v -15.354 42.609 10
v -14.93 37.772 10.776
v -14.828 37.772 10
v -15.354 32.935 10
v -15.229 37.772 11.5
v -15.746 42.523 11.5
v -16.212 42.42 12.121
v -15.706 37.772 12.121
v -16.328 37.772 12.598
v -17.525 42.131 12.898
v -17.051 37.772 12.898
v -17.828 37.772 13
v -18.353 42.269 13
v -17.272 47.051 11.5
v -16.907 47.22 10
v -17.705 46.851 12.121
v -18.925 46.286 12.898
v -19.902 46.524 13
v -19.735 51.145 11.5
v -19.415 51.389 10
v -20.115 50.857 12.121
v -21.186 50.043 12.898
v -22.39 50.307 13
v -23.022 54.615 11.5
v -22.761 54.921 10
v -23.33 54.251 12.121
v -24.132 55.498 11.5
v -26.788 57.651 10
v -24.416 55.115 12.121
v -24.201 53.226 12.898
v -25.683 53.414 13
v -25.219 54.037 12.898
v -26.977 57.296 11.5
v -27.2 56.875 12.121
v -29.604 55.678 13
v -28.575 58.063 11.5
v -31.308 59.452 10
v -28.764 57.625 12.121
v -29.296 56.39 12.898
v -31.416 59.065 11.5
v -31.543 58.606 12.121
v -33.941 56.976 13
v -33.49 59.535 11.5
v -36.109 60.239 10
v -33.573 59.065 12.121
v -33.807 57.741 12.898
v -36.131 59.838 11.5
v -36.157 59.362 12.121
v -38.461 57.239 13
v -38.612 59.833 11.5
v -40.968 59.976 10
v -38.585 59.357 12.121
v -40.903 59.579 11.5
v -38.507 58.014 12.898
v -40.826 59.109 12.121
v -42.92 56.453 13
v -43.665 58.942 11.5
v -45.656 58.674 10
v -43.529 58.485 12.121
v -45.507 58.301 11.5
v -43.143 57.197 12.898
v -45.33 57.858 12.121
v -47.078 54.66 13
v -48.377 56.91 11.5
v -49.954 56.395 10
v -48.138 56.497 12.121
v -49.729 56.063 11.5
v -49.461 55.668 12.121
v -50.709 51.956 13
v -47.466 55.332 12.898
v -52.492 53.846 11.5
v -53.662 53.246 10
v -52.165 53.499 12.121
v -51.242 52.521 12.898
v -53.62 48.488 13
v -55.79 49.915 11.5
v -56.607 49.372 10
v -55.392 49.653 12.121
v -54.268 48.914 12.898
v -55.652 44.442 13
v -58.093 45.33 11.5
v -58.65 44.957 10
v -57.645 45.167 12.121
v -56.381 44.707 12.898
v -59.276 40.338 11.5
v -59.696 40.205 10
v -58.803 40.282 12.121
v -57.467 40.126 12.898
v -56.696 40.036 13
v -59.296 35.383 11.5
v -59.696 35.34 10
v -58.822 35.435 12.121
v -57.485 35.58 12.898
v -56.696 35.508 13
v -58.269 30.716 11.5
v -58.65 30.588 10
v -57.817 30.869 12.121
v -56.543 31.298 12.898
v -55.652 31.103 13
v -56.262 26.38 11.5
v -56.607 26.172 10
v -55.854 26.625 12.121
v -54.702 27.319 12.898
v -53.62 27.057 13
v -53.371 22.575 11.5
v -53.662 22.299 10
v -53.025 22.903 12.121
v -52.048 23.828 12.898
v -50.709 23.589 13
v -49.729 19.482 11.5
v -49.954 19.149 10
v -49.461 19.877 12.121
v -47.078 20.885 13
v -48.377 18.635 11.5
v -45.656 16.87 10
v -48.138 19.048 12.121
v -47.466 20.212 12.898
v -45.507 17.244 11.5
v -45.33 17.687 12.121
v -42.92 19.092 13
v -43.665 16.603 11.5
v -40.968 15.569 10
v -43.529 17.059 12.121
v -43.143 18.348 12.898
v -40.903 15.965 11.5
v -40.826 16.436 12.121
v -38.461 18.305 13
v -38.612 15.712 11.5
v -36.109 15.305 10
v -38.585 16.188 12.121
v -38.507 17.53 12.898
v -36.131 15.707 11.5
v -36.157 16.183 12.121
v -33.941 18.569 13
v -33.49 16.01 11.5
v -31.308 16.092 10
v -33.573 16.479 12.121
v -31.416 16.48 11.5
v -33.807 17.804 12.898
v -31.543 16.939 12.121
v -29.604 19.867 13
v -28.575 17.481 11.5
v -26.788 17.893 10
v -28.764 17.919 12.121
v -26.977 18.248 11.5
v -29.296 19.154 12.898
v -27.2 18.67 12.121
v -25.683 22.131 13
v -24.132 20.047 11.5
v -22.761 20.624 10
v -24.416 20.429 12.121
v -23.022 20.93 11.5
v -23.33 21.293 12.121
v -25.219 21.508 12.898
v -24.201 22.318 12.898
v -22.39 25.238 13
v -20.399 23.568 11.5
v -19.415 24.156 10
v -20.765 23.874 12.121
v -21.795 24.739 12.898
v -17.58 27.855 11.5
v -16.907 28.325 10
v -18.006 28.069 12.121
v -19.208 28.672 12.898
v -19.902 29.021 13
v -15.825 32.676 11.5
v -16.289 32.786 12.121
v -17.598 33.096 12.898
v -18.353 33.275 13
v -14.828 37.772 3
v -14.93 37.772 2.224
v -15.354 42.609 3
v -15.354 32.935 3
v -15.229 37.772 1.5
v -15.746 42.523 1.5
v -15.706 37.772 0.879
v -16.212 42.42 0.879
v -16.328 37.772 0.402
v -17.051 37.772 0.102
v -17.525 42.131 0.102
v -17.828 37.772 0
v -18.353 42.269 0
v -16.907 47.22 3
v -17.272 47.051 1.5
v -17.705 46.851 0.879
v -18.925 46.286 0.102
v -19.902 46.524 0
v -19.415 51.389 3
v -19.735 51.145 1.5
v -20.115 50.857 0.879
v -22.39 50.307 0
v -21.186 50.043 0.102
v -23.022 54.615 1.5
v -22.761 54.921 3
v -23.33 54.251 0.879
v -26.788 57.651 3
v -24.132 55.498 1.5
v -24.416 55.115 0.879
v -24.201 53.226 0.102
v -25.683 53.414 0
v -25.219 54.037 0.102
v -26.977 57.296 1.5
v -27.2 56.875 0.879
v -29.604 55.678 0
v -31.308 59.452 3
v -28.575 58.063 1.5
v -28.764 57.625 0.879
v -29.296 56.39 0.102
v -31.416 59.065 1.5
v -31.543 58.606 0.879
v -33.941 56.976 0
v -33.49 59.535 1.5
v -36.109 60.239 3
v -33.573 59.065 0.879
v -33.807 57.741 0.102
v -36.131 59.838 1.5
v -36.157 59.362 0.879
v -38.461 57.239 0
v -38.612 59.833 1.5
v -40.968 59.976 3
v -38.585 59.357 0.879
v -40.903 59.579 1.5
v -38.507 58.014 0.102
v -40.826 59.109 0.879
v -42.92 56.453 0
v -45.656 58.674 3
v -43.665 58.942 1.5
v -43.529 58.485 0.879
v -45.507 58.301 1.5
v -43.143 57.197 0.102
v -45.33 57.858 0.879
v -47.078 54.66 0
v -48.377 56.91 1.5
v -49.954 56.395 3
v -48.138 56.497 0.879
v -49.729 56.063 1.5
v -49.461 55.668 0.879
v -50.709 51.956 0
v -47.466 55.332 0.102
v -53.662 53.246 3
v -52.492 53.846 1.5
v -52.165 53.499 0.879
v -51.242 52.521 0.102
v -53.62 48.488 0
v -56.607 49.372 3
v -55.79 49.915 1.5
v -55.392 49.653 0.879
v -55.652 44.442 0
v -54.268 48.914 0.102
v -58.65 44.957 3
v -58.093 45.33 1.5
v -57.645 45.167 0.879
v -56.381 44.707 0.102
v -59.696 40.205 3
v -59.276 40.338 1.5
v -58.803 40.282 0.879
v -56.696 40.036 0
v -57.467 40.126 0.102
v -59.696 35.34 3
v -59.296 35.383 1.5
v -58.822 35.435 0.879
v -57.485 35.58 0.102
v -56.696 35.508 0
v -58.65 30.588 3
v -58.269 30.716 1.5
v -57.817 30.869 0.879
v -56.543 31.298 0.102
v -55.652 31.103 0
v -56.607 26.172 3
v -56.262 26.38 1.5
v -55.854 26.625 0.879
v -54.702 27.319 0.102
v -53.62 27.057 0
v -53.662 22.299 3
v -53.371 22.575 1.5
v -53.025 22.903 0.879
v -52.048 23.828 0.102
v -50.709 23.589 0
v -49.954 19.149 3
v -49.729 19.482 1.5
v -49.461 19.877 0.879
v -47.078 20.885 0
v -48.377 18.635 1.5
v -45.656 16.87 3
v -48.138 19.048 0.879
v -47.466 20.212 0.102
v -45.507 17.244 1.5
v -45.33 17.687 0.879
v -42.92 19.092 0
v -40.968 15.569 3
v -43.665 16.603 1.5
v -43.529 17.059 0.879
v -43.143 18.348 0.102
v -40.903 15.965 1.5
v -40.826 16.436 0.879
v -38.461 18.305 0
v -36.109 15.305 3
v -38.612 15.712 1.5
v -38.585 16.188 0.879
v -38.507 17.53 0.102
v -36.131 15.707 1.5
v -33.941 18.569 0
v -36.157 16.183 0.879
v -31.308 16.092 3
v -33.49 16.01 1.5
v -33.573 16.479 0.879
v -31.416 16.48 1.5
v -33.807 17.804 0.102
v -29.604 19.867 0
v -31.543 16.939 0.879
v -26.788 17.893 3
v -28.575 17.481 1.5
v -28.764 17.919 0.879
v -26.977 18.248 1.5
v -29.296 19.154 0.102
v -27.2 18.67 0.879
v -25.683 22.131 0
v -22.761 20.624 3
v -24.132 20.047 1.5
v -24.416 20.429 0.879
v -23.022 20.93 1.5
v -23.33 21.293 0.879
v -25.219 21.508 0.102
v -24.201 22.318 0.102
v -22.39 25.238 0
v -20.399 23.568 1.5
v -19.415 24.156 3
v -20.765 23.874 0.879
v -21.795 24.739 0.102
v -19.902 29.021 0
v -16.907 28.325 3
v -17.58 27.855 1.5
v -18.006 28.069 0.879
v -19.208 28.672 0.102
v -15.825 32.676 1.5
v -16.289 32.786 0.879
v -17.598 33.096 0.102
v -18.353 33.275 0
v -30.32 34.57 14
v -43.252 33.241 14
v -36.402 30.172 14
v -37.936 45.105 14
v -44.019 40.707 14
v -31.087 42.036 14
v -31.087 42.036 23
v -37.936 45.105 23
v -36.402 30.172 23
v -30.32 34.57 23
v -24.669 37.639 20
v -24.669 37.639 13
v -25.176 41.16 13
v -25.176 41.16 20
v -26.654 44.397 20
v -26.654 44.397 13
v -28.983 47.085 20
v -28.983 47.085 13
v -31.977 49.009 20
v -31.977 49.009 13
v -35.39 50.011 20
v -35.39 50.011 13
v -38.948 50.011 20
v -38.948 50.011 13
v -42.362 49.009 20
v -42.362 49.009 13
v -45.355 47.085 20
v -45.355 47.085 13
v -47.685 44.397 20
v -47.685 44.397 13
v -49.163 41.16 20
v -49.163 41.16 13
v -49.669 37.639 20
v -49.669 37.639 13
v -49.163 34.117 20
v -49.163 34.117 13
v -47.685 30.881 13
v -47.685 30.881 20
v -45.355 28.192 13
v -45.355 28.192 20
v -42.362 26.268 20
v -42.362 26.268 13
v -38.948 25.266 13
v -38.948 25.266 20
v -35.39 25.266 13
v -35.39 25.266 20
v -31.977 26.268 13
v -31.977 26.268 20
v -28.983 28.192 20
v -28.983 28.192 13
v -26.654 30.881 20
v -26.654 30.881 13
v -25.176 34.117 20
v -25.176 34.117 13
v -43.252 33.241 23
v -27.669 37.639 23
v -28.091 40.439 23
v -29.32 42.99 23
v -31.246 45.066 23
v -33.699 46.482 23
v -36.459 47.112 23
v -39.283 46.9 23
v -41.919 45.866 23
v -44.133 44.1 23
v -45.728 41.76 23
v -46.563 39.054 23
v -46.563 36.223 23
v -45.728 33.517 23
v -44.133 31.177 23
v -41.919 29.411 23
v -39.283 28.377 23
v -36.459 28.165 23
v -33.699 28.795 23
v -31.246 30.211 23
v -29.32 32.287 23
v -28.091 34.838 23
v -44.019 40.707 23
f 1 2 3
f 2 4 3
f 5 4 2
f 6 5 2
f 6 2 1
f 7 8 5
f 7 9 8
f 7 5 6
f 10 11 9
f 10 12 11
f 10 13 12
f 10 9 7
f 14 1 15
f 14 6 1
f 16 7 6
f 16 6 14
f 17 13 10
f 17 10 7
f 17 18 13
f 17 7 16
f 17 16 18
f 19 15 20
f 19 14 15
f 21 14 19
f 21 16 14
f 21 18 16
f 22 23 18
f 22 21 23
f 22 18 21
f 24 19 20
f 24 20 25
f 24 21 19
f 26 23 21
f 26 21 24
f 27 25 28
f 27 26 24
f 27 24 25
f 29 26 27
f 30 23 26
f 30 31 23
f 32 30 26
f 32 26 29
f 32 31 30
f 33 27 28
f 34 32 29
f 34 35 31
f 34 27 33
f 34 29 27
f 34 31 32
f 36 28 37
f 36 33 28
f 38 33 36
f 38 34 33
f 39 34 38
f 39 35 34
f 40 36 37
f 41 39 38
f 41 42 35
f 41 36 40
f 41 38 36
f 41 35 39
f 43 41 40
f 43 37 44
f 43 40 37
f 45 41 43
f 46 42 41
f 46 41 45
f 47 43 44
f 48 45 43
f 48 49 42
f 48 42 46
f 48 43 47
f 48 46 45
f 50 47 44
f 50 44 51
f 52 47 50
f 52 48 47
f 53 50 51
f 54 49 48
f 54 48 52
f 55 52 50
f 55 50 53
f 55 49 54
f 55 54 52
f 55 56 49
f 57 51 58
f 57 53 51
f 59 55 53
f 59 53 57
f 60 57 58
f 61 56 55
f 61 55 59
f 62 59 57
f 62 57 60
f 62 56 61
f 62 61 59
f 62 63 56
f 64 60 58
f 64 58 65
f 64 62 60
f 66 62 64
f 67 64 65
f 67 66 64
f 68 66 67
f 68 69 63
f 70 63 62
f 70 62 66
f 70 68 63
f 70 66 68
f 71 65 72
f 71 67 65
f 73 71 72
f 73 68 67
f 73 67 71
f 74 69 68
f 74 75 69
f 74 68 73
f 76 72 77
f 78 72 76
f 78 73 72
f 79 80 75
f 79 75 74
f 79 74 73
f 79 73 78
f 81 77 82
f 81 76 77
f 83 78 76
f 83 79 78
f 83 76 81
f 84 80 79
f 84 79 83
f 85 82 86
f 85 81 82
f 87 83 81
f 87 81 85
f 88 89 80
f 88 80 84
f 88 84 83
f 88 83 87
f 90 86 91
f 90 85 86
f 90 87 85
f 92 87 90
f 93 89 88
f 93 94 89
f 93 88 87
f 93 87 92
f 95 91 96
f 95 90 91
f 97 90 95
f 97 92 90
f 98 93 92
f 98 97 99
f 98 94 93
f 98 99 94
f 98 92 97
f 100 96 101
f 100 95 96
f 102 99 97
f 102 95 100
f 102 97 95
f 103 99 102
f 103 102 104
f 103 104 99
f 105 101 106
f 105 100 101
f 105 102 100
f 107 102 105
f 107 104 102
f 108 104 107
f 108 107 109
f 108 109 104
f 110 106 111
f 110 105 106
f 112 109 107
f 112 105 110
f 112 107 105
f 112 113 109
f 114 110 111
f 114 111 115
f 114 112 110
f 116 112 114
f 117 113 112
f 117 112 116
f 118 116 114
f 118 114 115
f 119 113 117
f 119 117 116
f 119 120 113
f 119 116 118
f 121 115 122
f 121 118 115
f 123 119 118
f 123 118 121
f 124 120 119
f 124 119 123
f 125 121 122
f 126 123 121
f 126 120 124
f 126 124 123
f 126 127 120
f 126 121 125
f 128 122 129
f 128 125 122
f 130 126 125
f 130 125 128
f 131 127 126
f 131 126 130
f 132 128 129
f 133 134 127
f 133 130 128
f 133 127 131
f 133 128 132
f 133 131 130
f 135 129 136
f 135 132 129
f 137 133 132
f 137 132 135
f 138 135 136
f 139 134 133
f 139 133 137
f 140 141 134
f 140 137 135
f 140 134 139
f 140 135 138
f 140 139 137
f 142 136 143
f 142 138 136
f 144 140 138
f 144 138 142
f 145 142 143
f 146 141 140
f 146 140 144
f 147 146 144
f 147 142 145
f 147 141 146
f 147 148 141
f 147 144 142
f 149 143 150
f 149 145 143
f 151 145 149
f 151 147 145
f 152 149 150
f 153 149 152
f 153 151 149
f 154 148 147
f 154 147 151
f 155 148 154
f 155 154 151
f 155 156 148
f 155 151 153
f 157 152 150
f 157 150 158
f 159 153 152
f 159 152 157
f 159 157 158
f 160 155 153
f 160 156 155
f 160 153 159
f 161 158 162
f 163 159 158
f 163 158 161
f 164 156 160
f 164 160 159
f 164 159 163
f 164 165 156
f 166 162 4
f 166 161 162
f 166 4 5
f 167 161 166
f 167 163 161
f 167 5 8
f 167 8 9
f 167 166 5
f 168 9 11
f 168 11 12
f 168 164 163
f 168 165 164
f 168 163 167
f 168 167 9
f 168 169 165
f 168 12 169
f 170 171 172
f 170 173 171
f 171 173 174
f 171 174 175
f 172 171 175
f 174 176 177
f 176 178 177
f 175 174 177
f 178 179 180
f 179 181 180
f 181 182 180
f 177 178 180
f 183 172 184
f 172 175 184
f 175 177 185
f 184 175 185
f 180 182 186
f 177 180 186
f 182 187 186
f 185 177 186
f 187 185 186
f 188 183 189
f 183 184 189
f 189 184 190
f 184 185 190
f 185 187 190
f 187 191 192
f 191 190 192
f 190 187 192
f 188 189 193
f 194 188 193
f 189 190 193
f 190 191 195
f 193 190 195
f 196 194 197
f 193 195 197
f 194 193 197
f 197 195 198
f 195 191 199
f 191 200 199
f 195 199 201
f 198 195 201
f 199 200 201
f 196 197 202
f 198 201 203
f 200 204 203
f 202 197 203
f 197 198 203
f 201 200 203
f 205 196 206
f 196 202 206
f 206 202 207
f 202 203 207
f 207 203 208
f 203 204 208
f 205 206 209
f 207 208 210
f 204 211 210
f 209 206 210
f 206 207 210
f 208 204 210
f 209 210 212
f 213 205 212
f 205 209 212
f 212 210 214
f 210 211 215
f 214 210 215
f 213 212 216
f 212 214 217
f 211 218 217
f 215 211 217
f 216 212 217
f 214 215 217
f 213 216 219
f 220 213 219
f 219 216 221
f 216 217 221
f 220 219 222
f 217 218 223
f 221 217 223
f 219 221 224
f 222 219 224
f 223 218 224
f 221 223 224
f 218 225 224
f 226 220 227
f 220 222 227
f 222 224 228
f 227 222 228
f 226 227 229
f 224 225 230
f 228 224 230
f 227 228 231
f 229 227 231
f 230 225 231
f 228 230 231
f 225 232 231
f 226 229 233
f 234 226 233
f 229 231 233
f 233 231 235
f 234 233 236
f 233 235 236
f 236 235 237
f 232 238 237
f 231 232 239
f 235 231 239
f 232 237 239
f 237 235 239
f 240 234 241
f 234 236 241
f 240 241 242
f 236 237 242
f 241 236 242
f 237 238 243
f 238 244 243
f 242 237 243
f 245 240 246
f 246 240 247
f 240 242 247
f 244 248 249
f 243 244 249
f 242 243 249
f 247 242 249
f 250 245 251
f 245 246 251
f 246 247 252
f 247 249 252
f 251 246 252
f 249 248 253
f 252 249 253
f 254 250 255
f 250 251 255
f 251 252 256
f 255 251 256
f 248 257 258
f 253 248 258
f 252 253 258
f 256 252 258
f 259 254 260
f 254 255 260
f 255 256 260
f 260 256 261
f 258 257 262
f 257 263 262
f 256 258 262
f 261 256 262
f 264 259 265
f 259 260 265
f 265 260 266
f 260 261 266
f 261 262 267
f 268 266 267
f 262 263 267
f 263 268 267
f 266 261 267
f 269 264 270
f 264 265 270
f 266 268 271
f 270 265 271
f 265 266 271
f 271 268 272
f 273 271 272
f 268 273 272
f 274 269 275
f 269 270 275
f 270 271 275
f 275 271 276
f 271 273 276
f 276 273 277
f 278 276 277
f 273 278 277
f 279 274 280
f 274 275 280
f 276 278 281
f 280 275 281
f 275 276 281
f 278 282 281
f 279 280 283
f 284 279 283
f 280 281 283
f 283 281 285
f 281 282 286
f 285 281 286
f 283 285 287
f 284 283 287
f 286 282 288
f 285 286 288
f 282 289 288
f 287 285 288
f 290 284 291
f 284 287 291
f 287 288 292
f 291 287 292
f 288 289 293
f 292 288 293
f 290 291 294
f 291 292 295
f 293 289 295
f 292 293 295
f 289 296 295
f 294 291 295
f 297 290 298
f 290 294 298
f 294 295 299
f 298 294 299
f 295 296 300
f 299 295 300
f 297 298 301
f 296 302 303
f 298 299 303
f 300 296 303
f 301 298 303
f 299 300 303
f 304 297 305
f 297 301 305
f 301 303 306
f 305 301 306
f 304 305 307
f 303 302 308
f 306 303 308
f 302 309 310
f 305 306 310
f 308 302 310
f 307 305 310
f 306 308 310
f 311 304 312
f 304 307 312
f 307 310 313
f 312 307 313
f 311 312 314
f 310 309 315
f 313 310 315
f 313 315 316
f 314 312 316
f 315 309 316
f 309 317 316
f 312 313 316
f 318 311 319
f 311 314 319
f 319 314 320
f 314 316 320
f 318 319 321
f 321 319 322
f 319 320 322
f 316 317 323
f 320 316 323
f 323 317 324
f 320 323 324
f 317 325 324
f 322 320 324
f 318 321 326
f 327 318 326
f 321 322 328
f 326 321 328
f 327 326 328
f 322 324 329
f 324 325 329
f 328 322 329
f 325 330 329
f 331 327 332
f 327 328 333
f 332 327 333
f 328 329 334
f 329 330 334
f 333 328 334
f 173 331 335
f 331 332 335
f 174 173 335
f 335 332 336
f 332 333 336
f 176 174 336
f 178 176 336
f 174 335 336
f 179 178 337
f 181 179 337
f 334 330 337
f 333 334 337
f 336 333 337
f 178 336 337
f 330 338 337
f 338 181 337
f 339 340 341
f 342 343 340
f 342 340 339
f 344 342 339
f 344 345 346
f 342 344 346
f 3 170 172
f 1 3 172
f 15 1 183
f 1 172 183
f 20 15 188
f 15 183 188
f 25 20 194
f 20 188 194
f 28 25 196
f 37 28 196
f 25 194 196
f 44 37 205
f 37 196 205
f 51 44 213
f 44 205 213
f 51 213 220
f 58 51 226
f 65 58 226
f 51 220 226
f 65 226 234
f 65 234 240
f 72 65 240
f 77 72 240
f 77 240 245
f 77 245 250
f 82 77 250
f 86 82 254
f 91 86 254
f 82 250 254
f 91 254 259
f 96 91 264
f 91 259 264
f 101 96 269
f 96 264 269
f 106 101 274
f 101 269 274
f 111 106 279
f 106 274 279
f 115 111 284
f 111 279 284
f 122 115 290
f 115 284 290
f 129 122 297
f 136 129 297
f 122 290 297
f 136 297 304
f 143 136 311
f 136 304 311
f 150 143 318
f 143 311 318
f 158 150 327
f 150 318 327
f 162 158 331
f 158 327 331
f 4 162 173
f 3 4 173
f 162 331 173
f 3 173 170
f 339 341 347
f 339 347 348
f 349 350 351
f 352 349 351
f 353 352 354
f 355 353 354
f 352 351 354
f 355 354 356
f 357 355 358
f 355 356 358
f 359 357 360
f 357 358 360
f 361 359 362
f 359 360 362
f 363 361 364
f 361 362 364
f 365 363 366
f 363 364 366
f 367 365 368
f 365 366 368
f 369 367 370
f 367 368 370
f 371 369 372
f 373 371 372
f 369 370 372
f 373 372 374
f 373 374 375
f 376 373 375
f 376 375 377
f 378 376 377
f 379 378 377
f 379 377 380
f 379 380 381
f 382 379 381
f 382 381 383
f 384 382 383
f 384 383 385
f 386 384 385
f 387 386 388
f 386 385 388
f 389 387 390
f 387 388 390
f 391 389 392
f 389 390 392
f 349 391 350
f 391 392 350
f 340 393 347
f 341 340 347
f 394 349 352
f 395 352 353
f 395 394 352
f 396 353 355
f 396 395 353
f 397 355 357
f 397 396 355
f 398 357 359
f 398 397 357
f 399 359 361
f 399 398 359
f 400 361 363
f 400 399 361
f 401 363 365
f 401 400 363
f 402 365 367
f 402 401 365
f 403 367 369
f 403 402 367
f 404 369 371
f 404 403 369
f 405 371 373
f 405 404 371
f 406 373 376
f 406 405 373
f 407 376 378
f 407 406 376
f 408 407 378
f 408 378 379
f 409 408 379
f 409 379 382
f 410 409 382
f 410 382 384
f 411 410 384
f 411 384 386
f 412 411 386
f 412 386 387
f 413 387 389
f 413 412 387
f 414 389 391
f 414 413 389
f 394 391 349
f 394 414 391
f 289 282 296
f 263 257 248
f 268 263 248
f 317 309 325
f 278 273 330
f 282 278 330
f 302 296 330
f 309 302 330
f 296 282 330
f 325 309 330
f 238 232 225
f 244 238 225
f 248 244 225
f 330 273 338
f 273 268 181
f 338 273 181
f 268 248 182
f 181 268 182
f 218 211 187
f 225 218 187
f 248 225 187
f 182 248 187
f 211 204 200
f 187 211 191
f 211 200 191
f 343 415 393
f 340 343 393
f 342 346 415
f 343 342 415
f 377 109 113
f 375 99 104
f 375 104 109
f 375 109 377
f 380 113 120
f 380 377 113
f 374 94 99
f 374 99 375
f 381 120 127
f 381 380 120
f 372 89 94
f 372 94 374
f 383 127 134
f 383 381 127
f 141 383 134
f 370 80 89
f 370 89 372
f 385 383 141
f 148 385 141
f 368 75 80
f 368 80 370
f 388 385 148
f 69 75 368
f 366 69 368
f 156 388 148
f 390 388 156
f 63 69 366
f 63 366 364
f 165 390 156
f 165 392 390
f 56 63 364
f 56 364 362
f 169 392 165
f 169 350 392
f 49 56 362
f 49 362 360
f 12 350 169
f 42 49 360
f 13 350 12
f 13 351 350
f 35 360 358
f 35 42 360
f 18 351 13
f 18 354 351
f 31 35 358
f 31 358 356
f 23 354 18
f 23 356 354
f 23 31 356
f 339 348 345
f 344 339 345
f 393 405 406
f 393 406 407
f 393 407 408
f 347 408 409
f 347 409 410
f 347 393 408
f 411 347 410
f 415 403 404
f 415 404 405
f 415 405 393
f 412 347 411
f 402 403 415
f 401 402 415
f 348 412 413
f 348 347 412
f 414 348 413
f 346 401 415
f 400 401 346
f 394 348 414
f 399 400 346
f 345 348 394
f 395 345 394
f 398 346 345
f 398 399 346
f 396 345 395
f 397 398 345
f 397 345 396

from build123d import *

# Parameters (mm, degrees)
F1_R     = 12.5
F2_DEPTH = 13
F0_R     = 22.5
F3_DEPTH = 10
F5_R     = 3
F6_SIZE  = 3
F8_DEPTH = 9


# Not quite as in the source:
# - the program builds the solid bodies; features that only make, move or delete a surface that nothing else refers to are left out


with BuildPart() as f2:
    # F1 (on Top) → F2 (new body)
    with BuildSketch(Plane.XY):
        with Locations((-37.169251591, 37.6385599375)):
            Circle(F1_R)
    extrude(amount=F2_DEPTH)

    # F3 (add): a face of the model
    f3_faces = [f2.faces().sort_by_distance(p)[0] for p in [
        (-37.169251591, 37.6385599375, 13),
    ]]


with BuildPart() as f2b:
    # F0 (on Top) → F2, piece 2 (new body)
    with BuildSketch(Plane.XY):
        with Locations((-37.3275603359, 37.7723030881)):
            Circle(F0_R)
    extrude(amount=F2_DEPTH)


with BuildPart() as f2_1:
    add(f2.part)

    add(f2b.part)  # F3 merges F2b
    extrude(f3_faces, amount=F3_DEPTH)

    # F5
    f5_edges = [f2_1.edges().sort_by_distance(p)[0] for p in [
        (-59.82756, 37.772303, 13),
        (-59.82756, 37.772303, 0),
    ]]
    fillet(f5_edges, radius=F5_R)

    # F6
    f6_edges = [f2_1.edges().sort_by_distance(p)[0] for p in [
        (-49.669252, 37.63856, 23),
    ]]
    chamfer(f6_edges, length=F6_SIZE)

    # F4 (on face) → F8 (cut)
    with BuildSketch(Plane.XY.offset(23)):
        Polygon((-36.4021524321, 30.1723097264), (-30.3197396578, 34.5697621907), (-31.0868388166, 42.0360124018), (-37.9363507498, 45.1048101485), (-44.0187635242, 40.7073576842), (-43.2516643653, 33.2411074732), align=None)
    extrude(amount=-F8_DEPTH, mode=Mode.SUBTRACT)


solid = f2_1.part
